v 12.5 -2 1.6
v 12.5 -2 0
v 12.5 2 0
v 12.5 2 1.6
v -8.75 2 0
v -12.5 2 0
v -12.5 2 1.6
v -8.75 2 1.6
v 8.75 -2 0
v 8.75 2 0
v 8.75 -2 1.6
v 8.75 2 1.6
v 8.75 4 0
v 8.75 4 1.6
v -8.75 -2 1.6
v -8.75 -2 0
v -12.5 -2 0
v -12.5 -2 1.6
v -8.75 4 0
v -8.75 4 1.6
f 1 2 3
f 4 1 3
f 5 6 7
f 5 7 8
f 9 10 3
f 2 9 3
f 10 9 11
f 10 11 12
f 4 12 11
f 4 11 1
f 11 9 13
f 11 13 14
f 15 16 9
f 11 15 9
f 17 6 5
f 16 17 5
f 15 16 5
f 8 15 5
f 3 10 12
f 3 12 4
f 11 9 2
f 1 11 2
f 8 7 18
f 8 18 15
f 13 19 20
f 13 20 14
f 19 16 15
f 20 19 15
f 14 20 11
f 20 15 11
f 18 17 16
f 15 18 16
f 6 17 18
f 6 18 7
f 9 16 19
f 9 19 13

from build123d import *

# Parameters (mm, degrees)
F0_W     = 17.5
F0_H     = 4
F1_DEPTH = 1.6
F0_W_2   = 3.75
F2_DEPTH = 1.6
F3_DEPTH = 2


with BuildPart() as f1:
    # F0 (on Top) → F1 (new body)
    with BuildSketch(Plane.XY):
        Rectangle(F0_W, F0_H)
    extrude(amount=F1_DEPTH)

    # F3 (add): a face of the model
    f3_faces = [f1.faces().sort_by_distance(p)[0] for p in [
        (0, 2, 0.8),
    ]]
    extrude(f3_faces, amount=F3_DEPTH)


with BuildPart() as f2:
    # F0 (on Top) → F2 (new body, through all)
    with BuildSketch(Plane.XY):
        with Locations((-10.625, 0)):
            Rectangle(F0_W_2, F0_H)
    extrude(amount=F2_DEPTH)


with BuildPart() as f2b:
    # F0 (on Top) → F2, piece 2 (new body, through all)
    with BuildSketch(Plane.XY):
        with Locations((10.625, 0)):
            Rectangle(F0_W_2, F0_H)
    extrude(amount=F2_DEPTH)


solid = Compound([f1.part, f2.part, f2b.part])
